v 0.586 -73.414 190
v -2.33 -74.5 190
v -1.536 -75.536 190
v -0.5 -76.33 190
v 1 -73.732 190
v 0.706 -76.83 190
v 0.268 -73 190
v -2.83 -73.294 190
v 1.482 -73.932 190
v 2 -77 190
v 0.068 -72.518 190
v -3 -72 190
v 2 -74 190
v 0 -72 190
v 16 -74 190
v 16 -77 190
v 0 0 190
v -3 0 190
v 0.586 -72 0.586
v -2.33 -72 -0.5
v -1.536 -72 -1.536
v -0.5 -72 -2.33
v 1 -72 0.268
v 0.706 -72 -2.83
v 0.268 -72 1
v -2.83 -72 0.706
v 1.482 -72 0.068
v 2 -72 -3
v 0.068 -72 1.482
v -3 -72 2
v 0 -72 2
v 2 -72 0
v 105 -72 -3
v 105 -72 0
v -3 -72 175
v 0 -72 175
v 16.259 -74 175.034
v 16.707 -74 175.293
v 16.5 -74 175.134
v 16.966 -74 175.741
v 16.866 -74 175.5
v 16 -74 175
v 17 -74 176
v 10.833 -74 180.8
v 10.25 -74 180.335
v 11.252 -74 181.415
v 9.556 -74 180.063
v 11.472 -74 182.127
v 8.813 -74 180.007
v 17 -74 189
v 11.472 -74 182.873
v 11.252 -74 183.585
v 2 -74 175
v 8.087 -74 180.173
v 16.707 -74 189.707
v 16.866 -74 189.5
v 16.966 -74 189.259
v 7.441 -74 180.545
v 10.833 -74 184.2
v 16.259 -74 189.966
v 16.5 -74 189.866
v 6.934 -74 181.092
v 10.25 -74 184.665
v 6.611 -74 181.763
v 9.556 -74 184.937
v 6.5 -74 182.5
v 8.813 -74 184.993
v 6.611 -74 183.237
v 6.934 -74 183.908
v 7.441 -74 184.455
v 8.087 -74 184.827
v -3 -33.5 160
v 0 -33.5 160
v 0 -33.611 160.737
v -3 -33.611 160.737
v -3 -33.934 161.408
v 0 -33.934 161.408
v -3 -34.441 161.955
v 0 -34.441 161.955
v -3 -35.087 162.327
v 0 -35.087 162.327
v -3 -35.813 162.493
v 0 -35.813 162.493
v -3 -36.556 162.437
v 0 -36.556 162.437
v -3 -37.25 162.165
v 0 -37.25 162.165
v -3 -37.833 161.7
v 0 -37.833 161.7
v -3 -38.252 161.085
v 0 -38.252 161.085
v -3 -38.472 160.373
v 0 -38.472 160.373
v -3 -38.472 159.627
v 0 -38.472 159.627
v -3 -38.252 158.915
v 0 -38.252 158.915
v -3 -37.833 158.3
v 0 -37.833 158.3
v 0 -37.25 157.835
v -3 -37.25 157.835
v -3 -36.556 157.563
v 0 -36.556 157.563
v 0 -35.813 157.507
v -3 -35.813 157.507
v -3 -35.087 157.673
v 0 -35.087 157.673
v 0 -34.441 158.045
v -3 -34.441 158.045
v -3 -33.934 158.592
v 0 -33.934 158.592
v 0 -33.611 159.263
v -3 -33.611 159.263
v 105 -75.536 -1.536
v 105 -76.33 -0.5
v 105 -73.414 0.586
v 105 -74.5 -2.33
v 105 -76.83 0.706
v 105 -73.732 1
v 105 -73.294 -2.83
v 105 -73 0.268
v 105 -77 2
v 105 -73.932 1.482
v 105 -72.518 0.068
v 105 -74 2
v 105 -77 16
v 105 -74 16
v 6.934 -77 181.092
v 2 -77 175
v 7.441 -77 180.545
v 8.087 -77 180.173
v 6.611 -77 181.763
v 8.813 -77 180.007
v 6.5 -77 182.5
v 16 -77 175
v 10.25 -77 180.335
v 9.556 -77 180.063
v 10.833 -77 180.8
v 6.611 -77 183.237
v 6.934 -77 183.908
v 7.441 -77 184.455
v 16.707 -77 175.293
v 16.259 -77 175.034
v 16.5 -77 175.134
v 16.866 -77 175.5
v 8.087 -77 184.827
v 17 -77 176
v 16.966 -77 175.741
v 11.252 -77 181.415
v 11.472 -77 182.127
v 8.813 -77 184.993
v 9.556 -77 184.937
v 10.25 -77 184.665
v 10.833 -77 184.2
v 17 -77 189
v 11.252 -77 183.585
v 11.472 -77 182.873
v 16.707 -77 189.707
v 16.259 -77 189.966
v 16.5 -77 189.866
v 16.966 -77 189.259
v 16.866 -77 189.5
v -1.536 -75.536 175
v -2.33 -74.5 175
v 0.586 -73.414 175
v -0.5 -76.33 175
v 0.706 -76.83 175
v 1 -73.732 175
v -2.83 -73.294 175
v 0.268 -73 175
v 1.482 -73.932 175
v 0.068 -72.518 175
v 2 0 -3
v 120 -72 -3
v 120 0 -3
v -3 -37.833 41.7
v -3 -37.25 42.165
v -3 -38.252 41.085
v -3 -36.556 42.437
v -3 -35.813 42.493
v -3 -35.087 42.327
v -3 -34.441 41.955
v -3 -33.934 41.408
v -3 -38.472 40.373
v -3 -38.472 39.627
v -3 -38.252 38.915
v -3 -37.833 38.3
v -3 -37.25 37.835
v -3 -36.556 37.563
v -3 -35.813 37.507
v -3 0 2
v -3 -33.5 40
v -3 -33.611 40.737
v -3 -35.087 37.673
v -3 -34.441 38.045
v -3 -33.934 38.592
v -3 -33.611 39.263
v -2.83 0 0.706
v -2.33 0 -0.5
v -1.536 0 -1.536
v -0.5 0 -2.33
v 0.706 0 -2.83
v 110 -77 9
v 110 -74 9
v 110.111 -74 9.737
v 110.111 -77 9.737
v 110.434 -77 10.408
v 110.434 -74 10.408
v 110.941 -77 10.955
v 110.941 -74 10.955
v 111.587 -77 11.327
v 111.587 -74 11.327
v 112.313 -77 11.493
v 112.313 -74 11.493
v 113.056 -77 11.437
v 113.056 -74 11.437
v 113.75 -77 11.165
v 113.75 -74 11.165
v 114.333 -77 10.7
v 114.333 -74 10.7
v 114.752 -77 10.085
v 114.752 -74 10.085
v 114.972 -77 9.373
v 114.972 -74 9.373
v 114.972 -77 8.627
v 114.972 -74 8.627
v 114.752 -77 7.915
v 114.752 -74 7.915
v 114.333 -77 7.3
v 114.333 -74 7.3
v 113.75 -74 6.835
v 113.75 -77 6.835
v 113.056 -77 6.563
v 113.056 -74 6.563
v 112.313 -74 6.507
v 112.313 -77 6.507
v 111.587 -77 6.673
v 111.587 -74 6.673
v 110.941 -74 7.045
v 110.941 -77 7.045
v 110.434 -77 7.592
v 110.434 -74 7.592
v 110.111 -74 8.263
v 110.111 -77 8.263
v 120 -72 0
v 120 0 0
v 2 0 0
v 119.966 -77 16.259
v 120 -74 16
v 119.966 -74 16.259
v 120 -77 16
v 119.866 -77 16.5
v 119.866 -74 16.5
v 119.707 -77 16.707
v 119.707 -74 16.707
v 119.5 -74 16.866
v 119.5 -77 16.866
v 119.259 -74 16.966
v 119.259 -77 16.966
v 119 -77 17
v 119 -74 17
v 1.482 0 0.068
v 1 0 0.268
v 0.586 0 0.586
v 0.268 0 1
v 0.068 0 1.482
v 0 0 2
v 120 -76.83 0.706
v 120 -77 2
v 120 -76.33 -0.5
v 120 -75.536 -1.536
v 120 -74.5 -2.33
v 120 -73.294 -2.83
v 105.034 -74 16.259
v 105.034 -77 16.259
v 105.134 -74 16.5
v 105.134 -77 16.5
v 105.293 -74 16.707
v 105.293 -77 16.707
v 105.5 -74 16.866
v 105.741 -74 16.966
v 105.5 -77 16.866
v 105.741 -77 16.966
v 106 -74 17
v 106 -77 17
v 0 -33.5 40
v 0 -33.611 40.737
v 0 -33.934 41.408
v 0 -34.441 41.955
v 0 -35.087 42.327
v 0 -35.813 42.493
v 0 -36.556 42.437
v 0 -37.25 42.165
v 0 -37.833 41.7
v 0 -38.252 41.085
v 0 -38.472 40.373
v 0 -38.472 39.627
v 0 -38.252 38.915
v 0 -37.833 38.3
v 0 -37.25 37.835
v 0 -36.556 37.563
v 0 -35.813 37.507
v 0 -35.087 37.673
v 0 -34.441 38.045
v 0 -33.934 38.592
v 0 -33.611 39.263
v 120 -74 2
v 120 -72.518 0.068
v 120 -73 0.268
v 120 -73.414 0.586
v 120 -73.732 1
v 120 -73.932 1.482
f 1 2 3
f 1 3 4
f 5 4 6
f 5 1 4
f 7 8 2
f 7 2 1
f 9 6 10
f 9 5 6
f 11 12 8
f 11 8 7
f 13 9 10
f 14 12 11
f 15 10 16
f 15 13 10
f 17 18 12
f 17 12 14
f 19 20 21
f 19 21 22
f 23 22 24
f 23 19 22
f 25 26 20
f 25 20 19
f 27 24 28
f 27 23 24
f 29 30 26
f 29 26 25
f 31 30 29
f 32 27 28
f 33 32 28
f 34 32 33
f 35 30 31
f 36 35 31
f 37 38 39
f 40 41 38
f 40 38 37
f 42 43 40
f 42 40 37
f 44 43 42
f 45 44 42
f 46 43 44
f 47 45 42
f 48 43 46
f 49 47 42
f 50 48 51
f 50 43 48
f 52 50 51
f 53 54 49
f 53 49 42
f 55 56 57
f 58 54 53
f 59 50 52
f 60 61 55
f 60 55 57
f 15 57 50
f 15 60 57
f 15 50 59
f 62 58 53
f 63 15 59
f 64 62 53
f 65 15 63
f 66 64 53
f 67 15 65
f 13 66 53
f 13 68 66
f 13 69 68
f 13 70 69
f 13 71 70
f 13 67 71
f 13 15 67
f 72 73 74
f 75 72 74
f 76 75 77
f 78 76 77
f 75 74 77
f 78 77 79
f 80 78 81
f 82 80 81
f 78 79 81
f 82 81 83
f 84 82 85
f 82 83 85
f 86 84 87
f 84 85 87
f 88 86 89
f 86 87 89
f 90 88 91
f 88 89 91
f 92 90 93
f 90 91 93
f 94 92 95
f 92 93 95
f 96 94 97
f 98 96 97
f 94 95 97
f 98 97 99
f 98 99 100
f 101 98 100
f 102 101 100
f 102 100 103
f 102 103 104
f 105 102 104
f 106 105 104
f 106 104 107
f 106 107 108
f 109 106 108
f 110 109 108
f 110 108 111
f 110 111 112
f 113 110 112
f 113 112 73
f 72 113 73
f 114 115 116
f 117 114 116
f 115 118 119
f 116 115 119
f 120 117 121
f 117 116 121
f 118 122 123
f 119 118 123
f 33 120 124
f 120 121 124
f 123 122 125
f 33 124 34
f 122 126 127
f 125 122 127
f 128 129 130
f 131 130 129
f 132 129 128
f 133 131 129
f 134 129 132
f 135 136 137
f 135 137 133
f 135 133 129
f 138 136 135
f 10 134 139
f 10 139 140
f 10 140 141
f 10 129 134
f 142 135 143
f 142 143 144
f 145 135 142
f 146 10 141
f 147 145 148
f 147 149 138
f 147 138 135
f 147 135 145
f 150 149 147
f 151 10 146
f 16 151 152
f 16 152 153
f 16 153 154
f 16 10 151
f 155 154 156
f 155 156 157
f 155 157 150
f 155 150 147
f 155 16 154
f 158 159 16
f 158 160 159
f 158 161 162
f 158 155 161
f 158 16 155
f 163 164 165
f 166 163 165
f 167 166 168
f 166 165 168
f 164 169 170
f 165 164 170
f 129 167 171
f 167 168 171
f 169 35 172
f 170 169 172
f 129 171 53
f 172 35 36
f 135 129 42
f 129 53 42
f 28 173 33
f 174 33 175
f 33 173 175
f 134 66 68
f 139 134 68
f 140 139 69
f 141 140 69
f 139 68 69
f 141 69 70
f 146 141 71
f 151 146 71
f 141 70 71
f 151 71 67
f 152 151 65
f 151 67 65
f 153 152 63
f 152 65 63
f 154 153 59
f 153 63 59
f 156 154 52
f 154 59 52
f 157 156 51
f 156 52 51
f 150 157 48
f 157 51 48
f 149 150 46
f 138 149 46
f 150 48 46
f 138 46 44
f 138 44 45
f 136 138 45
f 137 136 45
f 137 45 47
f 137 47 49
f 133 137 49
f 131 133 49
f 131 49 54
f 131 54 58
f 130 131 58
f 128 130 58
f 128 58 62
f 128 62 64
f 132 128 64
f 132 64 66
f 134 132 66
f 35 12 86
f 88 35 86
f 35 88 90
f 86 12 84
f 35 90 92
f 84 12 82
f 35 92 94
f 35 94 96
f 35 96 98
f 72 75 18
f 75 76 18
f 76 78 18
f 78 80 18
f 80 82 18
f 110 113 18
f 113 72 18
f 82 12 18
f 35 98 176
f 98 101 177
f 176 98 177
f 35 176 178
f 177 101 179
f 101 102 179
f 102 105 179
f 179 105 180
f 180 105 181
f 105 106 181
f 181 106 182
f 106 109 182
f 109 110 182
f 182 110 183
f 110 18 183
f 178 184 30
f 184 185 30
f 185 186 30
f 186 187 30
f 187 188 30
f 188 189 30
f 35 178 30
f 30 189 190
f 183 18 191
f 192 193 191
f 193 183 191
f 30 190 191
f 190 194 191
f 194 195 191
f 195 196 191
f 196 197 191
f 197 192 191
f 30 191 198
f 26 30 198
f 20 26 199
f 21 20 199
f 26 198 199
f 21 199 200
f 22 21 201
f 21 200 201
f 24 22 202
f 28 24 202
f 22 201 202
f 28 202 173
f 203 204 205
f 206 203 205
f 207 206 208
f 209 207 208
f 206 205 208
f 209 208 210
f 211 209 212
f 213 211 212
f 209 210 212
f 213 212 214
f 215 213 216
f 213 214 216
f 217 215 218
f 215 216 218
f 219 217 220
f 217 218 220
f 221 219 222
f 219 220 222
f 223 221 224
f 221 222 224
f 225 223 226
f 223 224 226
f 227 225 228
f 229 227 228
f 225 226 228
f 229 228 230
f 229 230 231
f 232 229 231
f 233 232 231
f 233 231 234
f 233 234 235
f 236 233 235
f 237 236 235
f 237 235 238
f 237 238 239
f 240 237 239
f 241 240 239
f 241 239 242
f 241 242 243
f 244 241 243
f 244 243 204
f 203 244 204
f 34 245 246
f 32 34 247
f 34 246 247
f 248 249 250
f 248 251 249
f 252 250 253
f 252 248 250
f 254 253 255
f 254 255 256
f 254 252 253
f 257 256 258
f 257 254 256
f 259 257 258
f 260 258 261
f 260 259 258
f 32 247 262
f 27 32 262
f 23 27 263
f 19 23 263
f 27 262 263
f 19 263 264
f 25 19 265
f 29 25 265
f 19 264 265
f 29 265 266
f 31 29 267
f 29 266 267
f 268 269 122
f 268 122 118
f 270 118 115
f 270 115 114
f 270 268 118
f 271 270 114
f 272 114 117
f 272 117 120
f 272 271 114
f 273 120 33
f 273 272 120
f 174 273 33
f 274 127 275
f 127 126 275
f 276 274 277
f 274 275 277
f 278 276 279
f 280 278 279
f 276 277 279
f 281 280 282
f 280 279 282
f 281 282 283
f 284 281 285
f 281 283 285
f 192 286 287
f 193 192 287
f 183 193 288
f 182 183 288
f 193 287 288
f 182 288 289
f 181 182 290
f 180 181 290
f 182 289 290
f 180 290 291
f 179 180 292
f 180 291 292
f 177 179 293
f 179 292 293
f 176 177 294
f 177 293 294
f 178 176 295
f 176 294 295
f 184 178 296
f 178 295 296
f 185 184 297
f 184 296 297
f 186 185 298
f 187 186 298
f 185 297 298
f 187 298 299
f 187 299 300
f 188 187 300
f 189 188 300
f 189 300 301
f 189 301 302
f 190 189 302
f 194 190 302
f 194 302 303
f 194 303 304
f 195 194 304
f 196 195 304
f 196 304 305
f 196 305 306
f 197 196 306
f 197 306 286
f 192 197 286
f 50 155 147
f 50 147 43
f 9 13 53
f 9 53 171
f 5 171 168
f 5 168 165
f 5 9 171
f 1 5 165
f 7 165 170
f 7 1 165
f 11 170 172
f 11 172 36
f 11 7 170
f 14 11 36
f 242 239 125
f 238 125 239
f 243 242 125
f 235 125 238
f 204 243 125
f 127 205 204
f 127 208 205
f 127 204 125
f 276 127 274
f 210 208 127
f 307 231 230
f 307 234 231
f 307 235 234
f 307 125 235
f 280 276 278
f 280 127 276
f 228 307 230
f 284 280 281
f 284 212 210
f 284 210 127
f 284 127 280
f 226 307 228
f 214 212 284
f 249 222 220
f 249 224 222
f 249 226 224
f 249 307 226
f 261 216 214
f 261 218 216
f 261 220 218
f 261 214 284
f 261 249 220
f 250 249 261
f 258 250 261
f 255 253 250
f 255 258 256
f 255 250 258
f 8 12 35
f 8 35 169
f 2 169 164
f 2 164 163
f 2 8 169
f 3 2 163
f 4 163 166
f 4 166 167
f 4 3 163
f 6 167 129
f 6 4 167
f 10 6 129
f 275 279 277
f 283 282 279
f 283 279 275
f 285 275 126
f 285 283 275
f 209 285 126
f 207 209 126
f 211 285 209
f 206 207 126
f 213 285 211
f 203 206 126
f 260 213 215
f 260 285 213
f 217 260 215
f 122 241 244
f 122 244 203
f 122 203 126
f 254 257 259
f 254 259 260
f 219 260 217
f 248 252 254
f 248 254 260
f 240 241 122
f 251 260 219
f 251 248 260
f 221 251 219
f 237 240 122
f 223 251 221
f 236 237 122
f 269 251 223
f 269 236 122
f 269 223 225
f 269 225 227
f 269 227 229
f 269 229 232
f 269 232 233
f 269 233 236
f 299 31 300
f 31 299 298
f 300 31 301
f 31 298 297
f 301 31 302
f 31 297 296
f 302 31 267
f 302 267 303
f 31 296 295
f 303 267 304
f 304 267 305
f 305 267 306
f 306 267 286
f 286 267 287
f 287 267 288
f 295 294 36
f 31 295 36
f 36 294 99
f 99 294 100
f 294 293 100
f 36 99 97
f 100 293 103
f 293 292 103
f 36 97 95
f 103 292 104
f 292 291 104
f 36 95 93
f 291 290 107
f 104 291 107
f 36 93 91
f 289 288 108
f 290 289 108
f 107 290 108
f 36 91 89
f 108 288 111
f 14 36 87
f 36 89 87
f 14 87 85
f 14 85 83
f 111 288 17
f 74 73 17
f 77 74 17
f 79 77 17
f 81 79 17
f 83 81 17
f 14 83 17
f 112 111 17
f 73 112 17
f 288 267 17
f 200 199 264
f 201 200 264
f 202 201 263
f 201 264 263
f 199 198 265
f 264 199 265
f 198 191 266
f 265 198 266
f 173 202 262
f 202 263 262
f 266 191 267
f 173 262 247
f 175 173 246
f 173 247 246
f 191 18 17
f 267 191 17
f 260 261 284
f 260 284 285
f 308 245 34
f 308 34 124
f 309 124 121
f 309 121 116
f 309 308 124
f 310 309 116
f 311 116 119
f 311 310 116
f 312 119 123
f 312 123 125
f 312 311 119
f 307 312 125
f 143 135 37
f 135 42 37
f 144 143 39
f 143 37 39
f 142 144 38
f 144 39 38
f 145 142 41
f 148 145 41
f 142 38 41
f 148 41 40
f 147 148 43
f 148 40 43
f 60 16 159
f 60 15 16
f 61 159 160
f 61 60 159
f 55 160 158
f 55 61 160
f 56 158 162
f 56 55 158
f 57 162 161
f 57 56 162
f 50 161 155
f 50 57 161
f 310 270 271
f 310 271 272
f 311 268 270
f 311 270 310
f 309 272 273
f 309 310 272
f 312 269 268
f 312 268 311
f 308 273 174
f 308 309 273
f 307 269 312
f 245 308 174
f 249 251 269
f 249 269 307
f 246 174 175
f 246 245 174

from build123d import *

# Parameters (mm, degrees)
F1_DEPTH = 72
F3_DEPTH = 15
F5_DEPTH = 15
F6_R     = 1
F9_D     = 5
F11_D    = 5


with BuildPart() as f1:
    # F0 (on Front) → F1 (new body)
    with BuildSketch(Plane.XZ):
        with BuildLine():
            Line((0, 2), (0, 190))
            Line((0, 190), (-3, 190))
            Line((-3, 190), (-3, 2))
            ThreePointArc((-3, 2), (-1.535534, -1.535534), (2, -3))
            Line((2, -3), (120, -3))
            Line((120, -3), (120, 0))
            Line((120, 0), (2, 0))
            ThreePointArc((2, 0), (0.585786, 0.585786), (0, 2))
        make_face()
    extrude(amount=F1_DEPTH)

    # F2 (on face) → F3 (join)
    with BuildSketch(Plane.XY.offset(190)):
        with BuildLine():
            ThreePointArc((2, -74), (0.585786, -73.414214), (0, -72))
            Line((0, -72), (-3, -72))
            ThreePointArc((-3, -72), (-1.535534, -75.535534), (2, -77))
            Line((2, -77), (17, -77))
            Line((17, -77), (17, -74))
            Line((17, -74), (2, -74))
        make_face()
    extrude(amount=-F3_DEPTH)

    # F4 (on face) → F5 (join)
    with BuildSketch(Plane.YZ.offset(120)):
        with BuildLine():
            ThreePointArc((-72, 0), (-73.414214, 0.585786), (-74, 2))
            Line((-74, 2), (-74, 17))
            Line((-74, 17), (-77, 17))
            Line((-77, 17), (-77, 2))
            ThreePointArc((-77, 2), (-75.535534, -1.535534), (-72, -3))
            Line((-72, -3), (-72, 0))
        make_face()
    extrude(amount=-F5_DEPTH)

    # F6
    f6_edges = [f1.edges().sort_by_distance(p)[0] for p in [
        (120, -75.5, 17),
        (105, -75.5, 17),
        (17, -75.5, 190),
        (17, -75.5, 175),
    ]]
    fillet(f6_edges, radius=F6_R)

    # F9 (through all)
    with Locations(Plane.XZ.offset(77)):
        with Locations((9, 182.5), (112.5, 9)):
            Hole(F9_D / 2)

    # F11 (through all)
    with Locations(Plane(origin=(-3, 0, 0), x_dir=(0, -1, 0), z_dir=(-1, 0, 0))):
        with Locations((36, 160), (36, 40)):
            Hole(F11_D / 2)


solid = f1.part
